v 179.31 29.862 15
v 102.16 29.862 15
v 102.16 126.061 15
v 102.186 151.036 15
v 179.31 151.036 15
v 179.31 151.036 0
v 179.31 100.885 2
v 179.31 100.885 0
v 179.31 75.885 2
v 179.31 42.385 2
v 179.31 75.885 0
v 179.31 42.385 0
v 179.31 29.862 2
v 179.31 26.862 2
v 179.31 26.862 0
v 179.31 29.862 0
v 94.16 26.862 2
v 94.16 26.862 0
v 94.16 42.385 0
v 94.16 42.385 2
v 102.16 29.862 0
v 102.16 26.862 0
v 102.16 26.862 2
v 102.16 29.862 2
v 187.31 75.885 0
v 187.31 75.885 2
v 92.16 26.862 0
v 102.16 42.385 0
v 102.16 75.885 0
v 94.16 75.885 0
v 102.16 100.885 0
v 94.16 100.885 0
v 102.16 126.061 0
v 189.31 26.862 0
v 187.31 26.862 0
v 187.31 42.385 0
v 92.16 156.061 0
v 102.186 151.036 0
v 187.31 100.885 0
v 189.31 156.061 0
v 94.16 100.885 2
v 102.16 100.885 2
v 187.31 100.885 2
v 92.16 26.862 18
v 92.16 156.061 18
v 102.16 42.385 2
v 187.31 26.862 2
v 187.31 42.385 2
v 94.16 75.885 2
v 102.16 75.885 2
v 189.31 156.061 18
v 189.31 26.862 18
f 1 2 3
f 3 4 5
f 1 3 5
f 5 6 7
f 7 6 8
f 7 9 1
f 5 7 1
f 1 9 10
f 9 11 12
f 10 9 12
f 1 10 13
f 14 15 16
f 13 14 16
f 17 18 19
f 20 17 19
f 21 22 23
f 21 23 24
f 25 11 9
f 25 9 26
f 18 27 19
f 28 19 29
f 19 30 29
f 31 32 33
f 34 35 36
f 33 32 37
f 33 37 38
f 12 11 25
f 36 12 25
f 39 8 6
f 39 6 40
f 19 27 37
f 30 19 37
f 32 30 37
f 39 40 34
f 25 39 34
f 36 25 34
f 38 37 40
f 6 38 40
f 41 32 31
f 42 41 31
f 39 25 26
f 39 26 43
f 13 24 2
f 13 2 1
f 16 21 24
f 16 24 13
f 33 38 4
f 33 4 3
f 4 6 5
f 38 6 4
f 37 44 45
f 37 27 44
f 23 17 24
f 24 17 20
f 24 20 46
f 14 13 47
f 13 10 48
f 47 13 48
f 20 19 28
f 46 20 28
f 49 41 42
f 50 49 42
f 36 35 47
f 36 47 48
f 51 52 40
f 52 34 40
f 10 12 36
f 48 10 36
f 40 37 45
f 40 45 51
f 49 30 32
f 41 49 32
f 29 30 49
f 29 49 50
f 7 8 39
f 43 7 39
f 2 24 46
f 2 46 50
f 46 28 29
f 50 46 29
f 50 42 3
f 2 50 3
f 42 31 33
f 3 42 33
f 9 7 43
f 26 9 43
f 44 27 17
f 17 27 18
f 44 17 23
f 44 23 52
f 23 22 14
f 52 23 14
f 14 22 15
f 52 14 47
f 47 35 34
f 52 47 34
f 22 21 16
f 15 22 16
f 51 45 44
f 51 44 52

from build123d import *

# Parameters (mm, degrees)
MODEL_W             = 97.14935
MODEL_H             = 129.19946
EXTRUDE_1_DEPTH     = 15
SKETCH_5_W          = 97.14935
SKETCH_5_H          = 129.19946
EXTRUDE_2_DEPTH     = 3
SKETCH_4_W          = 8
SKETCH_4_H          = 25
CUT_EXTRUDE_1_DEPTH = 2


with BuildPart() as part:
    # Model → 凸台-拉伸1 (new body)
    with BuildSketch(Plane.XY):
        with Locations((140.734852429, 91.461726055)):
            Rectangle(MODEL_W, MODEL_H)
        Polygon((102.160177429, 94.384872236), (102.160177429, 82.384872236), (102.160177429, 35.884872236), (102.160177429, 29.861996055), (179.309527429, 29.861996055), (179.309527429, 35.884872236), (179.309527429, 82.384872236), (179.309527429, 94.384872236), (179.309527429, 118.984602236), (179.309527429, 126.061456055), (179.309527429, 151.036037203), (102.185575181, 151.036037203), (102.160177429, 126.061456055), (102.160177429, 118.984602236), align=None, mode=Mode.SUBTRACT)
    extrude(amount=EXTRUDE_1_DEPTH)

    # 草图5 → 凸台-拉伸2 (add)
    with BuildSketch(Plane.XY.offset(15)):
        with Locations((140.734852429, 91.461726055)):
            Rectangle(SKETCH_5_W, SKETCH_5_H)
    extrude(amount=EXTRUDE_2_DEPTH)

    # 草图4 → 切除-拉伸1 (cut)
    with BuildSketch(Plane.XY):
        with Locations((98.160177429, 29.884872236)):
            Rectangle(SKETCH_4_W, SKETCH_4_H)
        with Locations((183.309527429, 88.384872236)):
            Rectangle(SKETCH_4_W, SKETCH_4_H)
        with Locations((98.160177429, 88.384872236)):
            Rectangle(SKETCH_4_W, SKETCH_4_H)
        with Locations((183.309527429, 29.884872236)):
            Rectangle(SKETCH_4_W, SKETCH_4_H)
    extrude(amount=CUT_EXTRUDE_1_DEPTH, mode=Mode.SUBTRACT)


solid = part.part
